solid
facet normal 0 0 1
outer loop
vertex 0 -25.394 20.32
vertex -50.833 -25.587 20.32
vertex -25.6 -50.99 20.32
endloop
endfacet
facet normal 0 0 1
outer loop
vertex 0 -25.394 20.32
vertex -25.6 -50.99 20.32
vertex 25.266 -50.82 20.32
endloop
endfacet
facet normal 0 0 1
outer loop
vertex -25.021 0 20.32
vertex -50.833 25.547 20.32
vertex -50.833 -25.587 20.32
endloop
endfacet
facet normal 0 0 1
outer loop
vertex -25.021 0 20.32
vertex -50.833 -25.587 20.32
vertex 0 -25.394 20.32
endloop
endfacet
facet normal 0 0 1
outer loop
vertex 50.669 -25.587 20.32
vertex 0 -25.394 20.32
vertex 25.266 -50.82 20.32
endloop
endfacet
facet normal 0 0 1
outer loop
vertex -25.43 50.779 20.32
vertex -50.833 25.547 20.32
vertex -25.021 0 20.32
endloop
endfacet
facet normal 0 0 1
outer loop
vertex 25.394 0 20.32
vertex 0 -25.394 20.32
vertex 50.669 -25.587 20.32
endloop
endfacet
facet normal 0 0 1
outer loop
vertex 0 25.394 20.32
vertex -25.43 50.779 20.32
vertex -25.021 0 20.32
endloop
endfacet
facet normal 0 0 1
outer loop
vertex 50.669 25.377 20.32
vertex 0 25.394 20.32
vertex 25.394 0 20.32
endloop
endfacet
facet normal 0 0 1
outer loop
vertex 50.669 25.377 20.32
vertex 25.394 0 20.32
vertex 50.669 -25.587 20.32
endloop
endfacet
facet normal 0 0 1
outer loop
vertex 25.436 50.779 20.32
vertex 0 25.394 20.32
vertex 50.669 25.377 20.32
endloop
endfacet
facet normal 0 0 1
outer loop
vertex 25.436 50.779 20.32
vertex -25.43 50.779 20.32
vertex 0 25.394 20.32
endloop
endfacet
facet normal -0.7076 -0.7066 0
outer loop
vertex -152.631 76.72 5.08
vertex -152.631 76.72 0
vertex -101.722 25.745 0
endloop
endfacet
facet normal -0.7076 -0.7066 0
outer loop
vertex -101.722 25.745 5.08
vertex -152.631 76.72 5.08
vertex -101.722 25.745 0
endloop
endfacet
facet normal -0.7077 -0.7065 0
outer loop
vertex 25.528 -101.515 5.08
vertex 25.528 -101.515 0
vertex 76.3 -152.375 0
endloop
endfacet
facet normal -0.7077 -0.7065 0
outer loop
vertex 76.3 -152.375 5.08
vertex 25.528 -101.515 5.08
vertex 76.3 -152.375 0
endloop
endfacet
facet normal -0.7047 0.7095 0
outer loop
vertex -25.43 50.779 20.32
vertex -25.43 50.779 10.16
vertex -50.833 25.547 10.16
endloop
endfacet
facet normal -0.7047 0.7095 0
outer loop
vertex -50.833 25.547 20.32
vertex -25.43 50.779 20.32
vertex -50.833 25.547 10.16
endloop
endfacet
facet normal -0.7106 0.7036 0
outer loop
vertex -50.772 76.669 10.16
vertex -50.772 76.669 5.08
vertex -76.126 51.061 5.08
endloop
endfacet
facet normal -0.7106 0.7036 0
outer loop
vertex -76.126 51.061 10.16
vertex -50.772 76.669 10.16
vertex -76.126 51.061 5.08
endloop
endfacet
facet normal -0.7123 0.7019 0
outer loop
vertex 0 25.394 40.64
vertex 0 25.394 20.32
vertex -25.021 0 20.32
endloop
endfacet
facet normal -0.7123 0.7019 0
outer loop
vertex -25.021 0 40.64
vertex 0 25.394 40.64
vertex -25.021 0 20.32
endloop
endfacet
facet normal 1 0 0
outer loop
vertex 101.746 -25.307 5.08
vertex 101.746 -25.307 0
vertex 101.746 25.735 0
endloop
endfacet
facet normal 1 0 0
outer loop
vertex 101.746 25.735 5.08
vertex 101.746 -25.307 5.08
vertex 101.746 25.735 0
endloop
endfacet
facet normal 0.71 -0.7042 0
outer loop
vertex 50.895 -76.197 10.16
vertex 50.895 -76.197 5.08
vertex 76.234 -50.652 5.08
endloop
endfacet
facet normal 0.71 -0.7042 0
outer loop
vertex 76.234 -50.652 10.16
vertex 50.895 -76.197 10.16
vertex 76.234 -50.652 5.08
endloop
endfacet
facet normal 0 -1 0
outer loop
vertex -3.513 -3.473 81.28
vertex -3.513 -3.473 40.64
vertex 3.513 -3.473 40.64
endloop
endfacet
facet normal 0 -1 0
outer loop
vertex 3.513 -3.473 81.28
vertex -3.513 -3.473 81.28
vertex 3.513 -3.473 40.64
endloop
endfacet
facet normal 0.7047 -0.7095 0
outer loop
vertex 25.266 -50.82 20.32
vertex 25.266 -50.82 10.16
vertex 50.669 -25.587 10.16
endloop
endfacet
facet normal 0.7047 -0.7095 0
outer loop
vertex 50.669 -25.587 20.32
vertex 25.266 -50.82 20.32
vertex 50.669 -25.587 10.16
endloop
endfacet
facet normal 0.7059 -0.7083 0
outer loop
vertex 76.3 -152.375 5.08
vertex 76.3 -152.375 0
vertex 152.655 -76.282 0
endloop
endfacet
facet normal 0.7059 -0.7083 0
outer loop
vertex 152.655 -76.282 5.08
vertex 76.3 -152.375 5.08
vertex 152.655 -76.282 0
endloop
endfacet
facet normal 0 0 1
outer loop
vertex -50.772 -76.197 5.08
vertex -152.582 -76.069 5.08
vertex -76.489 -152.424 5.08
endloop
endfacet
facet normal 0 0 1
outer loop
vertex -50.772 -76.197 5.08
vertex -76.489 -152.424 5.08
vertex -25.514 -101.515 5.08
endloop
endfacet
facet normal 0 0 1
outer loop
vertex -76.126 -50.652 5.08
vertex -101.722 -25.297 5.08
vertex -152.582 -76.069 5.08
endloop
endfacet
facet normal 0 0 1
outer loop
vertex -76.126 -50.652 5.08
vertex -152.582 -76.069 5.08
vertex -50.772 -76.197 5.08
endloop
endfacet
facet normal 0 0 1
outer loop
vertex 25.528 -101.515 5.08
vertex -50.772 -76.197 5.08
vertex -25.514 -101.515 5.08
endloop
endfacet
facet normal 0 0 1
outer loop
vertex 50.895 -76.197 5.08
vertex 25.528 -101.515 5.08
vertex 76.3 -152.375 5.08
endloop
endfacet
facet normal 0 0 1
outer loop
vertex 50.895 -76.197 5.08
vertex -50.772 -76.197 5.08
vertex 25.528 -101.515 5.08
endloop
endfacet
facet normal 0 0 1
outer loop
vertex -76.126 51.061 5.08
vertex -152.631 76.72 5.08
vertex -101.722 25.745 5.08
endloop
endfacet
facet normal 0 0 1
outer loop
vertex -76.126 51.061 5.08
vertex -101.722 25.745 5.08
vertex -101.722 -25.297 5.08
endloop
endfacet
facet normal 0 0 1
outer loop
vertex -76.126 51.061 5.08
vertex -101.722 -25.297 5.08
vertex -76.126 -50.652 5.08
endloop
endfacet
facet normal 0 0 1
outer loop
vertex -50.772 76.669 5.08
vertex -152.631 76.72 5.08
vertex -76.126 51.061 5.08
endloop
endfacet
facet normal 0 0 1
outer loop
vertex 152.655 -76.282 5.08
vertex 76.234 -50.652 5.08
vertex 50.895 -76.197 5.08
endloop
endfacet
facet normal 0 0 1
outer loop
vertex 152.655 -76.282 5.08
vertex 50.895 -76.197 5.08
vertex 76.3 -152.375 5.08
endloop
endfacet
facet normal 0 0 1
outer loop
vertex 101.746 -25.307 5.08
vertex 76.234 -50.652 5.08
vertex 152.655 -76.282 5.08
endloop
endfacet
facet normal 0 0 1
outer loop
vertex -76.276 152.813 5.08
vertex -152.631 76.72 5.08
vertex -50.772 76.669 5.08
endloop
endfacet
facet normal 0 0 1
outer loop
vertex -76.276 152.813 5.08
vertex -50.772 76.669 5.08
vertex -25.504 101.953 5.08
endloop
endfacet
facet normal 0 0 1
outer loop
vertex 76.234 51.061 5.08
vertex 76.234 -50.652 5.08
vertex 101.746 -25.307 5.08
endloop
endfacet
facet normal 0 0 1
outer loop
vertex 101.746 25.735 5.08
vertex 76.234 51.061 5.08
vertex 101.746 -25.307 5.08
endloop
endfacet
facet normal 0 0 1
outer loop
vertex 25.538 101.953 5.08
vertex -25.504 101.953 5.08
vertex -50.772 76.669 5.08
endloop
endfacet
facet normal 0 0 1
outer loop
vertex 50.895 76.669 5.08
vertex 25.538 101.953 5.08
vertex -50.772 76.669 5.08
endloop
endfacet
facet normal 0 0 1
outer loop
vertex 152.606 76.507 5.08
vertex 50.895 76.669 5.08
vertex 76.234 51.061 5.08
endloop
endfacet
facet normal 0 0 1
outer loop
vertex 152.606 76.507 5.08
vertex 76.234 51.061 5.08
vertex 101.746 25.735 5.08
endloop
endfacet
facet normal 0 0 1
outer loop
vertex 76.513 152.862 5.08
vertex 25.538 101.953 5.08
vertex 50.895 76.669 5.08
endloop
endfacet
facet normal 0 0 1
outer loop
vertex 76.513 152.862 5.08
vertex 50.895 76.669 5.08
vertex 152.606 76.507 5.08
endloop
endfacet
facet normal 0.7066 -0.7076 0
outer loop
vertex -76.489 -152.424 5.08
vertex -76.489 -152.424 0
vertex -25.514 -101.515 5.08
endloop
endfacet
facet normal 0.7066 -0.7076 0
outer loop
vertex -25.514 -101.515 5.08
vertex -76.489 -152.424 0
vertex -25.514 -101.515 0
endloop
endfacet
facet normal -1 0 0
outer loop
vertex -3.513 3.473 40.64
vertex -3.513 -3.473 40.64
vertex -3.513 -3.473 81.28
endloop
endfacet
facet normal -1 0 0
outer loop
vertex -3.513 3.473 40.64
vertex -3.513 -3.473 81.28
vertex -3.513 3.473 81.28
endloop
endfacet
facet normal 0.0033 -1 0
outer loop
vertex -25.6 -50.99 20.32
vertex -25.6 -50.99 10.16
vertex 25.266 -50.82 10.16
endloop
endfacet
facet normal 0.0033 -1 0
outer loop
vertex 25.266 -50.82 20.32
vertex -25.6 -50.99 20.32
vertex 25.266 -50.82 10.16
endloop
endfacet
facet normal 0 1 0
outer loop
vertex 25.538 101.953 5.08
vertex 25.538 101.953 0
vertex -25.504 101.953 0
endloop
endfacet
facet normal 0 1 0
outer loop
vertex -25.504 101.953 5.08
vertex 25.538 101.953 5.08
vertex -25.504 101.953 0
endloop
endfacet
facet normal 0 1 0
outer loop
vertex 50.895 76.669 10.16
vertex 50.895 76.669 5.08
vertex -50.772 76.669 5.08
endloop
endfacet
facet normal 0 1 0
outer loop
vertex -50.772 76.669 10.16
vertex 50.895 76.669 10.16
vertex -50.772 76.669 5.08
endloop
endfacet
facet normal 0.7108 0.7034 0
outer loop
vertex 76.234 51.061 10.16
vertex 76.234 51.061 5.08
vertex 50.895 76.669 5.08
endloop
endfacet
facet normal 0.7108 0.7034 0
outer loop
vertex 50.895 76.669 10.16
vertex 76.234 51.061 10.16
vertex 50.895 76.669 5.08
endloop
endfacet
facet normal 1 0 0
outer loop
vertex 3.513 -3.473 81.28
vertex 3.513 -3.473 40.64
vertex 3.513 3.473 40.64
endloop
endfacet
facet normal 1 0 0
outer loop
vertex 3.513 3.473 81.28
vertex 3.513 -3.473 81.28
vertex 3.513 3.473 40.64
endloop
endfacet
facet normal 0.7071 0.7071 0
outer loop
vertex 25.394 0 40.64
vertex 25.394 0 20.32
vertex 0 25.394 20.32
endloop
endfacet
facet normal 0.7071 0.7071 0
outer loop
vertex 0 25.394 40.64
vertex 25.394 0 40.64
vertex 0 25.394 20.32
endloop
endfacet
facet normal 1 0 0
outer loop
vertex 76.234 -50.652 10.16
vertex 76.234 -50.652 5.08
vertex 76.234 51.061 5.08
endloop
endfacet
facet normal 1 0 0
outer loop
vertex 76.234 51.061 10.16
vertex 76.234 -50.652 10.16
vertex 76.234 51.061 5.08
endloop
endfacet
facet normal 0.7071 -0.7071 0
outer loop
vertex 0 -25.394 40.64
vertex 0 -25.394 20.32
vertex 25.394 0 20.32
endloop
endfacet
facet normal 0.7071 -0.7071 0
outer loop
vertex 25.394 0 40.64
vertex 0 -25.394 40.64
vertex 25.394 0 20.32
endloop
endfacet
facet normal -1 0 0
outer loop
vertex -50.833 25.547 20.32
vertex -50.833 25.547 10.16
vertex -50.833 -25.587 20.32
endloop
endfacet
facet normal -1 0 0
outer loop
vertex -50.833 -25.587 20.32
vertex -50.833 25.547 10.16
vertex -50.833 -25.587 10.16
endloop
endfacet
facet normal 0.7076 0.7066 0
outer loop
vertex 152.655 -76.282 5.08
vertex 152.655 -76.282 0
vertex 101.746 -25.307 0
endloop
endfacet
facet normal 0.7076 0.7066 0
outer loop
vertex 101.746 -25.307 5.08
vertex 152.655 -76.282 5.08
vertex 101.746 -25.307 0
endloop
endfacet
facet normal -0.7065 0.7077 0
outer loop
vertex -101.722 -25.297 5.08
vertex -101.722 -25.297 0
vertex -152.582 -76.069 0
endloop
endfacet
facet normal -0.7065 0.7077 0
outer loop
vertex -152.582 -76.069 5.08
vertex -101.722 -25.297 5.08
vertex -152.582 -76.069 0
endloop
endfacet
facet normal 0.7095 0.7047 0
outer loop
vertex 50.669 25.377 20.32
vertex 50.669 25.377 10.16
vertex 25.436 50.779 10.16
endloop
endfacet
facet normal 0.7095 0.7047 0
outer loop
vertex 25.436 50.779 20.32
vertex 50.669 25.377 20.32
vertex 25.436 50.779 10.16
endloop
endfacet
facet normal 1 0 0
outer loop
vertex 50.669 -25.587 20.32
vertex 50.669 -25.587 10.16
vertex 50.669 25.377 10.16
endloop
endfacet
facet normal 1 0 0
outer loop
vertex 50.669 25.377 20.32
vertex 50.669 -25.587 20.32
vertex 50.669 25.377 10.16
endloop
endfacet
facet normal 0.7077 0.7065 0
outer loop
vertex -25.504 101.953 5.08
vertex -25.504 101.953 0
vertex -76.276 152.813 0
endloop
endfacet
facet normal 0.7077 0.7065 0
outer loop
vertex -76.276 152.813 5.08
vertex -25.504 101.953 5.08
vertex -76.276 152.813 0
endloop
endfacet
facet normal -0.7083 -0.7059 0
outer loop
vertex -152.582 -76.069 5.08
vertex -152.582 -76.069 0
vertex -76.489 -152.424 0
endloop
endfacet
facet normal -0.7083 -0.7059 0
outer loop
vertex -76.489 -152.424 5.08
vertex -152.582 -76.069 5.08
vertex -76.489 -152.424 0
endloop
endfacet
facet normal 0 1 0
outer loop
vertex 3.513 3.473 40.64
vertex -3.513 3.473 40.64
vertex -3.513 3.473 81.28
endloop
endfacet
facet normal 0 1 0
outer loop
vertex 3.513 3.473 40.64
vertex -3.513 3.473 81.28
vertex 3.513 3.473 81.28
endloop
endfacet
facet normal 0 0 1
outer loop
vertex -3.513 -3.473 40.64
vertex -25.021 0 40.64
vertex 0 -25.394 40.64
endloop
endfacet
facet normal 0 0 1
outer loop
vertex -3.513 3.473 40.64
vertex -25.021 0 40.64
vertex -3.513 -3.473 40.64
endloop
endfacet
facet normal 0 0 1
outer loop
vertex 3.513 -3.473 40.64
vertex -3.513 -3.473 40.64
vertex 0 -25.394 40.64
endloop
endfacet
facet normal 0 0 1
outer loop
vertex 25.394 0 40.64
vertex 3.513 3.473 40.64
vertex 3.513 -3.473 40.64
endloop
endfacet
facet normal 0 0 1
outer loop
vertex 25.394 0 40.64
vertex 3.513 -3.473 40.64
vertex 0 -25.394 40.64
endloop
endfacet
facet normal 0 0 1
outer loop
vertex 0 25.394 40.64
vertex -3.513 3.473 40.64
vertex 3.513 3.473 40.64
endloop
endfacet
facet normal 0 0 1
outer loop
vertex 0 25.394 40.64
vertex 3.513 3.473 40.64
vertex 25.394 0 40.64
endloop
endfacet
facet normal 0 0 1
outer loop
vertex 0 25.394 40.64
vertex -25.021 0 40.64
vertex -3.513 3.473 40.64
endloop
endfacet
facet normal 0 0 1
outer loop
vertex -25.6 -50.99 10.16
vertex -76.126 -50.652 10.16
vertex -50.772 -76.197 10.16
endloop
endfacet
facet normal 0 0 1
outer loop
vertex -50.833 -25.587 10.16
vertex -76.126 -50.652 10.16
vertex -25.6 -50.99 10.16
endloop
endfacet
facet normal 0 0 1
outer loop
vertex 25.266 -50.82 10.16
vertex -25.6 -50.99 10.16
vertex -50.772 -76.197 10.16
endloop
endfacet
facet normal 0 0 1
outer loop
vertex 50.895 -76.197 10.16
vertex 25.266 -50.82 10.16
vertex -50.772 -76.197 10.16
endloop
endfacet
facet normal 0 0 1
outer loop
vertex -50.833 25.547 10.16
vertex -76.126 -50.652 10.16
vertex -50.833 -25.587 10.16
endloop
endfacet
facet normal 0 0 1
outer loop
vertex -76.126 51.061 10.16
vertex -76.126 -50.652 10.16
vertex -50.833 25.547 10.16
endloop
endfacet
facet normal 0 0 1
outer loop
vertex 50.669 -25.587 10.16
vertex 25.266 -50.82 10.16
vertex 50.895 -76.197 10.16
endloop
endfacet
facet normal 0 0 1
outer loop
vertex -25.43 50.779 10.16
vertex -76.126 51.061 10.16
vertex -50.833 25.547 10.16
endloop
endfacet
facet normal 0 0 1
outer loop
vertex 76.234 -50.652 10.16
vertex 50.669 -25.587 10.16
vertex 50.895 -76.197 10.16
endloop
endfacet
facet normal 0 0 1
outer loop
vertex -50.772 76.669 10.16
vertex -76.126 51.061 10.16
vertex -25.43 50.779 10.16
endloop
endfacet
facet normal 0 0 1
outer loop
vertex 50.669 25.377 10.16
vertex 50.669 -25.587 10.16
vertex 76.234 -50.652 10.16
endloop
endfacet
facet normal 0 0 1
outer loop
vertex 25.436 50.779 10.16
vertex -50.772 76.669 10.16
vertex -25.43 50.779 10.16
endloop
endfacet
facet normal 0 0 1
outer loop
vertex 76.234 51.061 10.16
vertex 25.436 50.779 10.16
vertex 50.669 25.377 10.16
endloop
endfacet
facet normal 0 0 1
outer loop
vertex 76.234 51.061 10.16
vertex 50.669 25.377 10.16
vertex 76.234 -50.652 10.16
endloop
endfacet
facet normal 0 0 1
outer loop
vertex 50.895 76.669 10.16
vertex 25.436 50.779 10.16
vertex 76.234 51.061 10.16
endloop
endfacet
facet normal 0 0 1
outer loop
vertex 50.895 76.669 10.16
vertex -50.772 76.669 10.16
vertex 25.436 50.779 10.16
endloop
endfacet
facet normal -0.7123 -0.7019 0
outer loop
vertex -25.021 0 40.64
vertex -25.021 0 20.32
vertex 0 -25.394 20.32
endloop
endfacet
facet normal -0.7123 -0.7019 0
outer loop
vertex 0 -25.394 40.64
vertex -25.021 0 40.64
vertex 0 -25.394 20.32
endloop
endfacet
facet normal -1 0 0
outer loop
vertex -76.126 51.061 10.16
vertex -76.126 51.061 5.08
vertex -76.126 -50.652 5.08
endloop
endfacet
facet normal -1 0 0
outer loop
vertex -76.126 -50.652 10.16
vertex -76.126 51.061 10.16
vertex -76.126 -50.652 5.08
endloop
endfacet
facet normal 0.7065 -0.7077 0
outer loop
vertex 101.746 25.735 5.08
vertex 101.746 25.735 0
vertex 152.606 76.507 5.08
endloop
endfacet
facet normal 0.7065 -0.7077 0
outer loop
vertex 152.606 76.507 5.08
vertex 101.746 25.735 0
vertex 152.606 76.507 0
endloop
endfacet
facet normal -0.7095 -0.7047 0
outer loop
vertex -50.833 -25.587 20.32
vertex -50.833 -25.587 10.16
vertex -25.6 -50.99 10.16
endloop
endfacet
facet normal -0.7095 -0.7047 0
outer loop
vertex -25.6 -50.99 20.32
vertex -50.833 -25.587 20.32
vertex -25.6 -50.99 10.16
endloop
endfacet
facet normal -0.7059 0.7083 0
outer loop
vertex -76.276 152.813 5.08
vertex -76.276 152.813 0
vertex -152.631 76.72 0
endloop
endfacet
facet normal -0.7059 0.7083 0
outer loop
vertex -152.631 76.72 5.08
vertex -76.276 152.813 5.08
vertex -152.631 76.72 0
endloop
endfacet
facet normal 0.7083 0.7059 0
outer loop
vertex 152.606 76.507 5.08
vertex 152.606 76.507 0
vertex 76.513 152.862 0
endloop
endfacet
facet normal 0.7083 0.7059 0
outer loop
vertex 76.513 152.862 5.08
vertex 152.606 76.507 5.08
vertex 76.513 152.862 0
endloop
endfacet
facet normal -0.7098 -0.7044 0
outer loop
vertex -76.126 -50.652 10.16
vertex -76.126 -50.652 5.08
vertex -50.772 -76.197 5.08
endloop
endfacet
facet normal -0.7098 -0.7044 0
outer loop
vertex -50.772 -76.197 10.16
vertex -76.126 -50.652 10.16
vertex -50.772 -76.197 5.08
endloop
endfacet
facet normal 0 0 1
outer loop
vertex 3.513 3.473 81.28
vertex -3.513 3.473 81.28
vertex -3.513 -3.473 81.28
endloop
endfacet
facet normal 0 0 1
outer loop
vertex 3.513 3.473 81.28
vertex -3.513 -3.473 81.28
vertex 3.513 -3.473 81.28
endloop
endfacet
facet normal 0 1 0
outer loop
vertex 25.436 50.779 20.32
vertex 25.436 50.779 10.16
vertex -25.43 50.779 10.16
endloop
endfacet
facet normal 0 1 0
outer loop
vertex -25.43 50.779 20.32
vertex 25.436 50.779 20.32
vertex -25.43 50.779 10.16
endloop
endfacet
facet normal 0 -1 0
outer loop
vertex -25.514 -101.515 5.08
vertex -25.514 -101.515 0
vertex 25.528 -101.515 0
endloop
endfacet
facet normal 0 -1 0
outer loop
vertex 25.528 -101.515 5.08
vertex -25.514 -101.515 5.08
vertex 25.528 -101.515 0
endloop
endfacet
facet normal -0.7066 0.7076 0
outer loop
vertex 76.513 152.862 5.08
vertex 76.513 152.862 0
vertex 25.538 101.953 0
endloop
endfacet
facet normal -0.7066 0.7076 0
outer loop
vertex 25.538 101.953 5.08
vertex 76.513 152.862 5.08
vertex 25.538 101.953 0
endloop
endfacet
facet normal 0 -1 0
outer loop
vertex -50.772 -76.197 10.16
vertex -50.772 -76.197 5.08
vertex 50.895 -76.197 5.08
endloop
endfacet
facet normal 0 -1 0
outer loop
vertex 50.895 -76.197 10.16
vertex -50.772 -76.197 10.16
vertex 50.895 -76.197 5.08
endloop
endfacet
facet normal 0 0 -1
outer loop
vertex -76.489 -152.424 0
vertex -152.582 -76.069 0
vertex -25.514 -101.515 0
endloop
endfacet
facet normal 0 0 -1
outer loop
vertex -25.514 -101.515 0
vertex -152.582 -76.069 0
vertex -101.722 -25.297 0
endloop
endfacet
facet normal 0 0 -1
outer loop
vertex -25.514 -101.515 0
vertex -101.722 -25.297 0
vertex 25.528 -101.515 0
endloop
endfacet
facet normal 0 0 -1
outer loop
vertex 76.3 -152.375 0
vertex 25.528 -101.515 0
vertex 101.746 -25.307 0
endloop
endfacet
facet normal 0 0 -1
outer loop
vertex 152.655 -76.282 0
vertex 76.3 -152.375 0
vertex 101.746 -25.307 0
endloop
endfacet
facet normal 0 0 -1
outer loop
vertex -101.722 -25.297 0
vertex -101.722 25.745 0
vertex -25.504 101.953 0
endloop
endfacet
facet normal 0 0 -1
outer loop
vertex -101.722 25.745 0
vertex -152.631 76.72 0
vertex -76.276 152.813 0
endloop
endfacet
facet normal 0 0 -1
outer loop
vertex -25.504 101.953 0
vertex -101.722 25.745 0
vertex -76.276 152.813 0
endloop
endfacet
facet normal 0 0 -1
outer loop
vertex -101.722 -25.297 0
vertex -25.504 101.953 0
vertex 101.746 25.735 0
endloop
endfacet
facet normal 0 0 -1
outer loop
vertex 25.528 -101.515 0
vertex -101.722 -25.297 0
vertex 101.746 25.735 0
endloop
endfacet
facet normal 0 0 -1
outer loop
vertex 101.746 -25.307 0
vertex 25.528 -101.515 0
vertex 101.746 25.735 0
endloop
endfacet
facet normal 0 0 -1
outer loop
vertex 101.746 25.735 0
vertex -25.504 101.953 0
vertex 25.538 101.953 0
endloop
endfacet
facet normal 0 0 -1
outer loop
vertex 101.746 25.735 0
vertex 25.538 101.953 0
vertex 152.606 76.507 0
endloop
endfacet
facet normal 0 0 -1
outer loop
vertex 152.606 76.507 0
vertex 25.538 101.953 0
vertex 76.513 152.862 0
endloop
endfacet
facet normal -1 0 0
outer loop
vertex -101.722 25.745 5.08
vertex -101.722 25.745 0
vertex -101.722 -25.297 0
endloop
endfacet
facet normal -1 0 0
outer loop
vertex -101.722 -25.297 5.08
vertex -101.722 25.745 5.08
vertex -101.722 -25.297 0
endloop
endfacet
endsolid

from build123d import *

# Parameters (mm, degrees)
F0_W     = 7.026562
F0_H     = 6.945758
F1_DEPTH = 81.28
F3_DEPTH = 40.64
F5_DEPTH = 20.32
F7_DEPTH = 10.16
F9_DEPTH = 5.08


with BuildPart() as f1:
    # F0 (on Top) → F1 (new body)
    with BuildSketch(Plane.XY):
        Rectangle(F0_W, F0_H)
    extrude(amount=F1_DEPTH)

    # F2 (on Top) → F3 (join)
    with BuildSketch(Plane.XY):
        Polygon((0, 25.393864), (-25.020789, 0), (0, -25.393864), (25.393864, 0), align=None)
    extrude(amount=F3_DEPTH)

    # F4 (on Top) → F5 (join)
    with BuildSketch(Plane.XY):
        Polygon((25.43629, 50.779495), (0, 50.779495), (-25.430322, 50.779495), (-50.833207, 25.546703), (-50.833207, 0), (-50.833207, -25.586797), (-25.600415, -50.989682), (25.266197, -50.819589), (50.669082, -25.586797), (50.669082, 25.37661), align=None)
    extrude(amount=F5_DEPTH)

    # F6 (on Top) → F7 (join)
    with BuildSketch(Plane.XY):
        Polygon((76.233596, -50.651934), (76.233596, 51.060922), (50.894871, 76.66897), (0, 76.66897), (-50.771996, 76.66897), (-76.126471, 51.060922), (-76.126471, -50.651934), (-50.771996, -76.197065), (0, -76.197065), (50.894871, -76.197065), align=None)
    extrude(amount=F7_DEPTH)

    # F8 (on Top) → F9 (join)
    with BuildSketch(Plane.XY):
        Polygon((-25.513835, -101.515338), (0, -101.515338), (25.52755, -101.515338), (76.299801, -152.375132), (152.654715, -76.282322), (101.746045, -25.306873), (101.746045, 25.734512), (152.605839, 76.506764), (76.51303, 152.861677), (25.53758, 101.953007), (-25.503805, 101.953007), (-76.276056, 152.812801), (-152.63097, 76.719992), (-101.7223, 25.744542), (-101.7223, -25.296843), (-152.582094, -76.069094), (-76.489285, -152.424008), align=None)
    extrude(amount=F9_DEPTH)


solid = f1.part
